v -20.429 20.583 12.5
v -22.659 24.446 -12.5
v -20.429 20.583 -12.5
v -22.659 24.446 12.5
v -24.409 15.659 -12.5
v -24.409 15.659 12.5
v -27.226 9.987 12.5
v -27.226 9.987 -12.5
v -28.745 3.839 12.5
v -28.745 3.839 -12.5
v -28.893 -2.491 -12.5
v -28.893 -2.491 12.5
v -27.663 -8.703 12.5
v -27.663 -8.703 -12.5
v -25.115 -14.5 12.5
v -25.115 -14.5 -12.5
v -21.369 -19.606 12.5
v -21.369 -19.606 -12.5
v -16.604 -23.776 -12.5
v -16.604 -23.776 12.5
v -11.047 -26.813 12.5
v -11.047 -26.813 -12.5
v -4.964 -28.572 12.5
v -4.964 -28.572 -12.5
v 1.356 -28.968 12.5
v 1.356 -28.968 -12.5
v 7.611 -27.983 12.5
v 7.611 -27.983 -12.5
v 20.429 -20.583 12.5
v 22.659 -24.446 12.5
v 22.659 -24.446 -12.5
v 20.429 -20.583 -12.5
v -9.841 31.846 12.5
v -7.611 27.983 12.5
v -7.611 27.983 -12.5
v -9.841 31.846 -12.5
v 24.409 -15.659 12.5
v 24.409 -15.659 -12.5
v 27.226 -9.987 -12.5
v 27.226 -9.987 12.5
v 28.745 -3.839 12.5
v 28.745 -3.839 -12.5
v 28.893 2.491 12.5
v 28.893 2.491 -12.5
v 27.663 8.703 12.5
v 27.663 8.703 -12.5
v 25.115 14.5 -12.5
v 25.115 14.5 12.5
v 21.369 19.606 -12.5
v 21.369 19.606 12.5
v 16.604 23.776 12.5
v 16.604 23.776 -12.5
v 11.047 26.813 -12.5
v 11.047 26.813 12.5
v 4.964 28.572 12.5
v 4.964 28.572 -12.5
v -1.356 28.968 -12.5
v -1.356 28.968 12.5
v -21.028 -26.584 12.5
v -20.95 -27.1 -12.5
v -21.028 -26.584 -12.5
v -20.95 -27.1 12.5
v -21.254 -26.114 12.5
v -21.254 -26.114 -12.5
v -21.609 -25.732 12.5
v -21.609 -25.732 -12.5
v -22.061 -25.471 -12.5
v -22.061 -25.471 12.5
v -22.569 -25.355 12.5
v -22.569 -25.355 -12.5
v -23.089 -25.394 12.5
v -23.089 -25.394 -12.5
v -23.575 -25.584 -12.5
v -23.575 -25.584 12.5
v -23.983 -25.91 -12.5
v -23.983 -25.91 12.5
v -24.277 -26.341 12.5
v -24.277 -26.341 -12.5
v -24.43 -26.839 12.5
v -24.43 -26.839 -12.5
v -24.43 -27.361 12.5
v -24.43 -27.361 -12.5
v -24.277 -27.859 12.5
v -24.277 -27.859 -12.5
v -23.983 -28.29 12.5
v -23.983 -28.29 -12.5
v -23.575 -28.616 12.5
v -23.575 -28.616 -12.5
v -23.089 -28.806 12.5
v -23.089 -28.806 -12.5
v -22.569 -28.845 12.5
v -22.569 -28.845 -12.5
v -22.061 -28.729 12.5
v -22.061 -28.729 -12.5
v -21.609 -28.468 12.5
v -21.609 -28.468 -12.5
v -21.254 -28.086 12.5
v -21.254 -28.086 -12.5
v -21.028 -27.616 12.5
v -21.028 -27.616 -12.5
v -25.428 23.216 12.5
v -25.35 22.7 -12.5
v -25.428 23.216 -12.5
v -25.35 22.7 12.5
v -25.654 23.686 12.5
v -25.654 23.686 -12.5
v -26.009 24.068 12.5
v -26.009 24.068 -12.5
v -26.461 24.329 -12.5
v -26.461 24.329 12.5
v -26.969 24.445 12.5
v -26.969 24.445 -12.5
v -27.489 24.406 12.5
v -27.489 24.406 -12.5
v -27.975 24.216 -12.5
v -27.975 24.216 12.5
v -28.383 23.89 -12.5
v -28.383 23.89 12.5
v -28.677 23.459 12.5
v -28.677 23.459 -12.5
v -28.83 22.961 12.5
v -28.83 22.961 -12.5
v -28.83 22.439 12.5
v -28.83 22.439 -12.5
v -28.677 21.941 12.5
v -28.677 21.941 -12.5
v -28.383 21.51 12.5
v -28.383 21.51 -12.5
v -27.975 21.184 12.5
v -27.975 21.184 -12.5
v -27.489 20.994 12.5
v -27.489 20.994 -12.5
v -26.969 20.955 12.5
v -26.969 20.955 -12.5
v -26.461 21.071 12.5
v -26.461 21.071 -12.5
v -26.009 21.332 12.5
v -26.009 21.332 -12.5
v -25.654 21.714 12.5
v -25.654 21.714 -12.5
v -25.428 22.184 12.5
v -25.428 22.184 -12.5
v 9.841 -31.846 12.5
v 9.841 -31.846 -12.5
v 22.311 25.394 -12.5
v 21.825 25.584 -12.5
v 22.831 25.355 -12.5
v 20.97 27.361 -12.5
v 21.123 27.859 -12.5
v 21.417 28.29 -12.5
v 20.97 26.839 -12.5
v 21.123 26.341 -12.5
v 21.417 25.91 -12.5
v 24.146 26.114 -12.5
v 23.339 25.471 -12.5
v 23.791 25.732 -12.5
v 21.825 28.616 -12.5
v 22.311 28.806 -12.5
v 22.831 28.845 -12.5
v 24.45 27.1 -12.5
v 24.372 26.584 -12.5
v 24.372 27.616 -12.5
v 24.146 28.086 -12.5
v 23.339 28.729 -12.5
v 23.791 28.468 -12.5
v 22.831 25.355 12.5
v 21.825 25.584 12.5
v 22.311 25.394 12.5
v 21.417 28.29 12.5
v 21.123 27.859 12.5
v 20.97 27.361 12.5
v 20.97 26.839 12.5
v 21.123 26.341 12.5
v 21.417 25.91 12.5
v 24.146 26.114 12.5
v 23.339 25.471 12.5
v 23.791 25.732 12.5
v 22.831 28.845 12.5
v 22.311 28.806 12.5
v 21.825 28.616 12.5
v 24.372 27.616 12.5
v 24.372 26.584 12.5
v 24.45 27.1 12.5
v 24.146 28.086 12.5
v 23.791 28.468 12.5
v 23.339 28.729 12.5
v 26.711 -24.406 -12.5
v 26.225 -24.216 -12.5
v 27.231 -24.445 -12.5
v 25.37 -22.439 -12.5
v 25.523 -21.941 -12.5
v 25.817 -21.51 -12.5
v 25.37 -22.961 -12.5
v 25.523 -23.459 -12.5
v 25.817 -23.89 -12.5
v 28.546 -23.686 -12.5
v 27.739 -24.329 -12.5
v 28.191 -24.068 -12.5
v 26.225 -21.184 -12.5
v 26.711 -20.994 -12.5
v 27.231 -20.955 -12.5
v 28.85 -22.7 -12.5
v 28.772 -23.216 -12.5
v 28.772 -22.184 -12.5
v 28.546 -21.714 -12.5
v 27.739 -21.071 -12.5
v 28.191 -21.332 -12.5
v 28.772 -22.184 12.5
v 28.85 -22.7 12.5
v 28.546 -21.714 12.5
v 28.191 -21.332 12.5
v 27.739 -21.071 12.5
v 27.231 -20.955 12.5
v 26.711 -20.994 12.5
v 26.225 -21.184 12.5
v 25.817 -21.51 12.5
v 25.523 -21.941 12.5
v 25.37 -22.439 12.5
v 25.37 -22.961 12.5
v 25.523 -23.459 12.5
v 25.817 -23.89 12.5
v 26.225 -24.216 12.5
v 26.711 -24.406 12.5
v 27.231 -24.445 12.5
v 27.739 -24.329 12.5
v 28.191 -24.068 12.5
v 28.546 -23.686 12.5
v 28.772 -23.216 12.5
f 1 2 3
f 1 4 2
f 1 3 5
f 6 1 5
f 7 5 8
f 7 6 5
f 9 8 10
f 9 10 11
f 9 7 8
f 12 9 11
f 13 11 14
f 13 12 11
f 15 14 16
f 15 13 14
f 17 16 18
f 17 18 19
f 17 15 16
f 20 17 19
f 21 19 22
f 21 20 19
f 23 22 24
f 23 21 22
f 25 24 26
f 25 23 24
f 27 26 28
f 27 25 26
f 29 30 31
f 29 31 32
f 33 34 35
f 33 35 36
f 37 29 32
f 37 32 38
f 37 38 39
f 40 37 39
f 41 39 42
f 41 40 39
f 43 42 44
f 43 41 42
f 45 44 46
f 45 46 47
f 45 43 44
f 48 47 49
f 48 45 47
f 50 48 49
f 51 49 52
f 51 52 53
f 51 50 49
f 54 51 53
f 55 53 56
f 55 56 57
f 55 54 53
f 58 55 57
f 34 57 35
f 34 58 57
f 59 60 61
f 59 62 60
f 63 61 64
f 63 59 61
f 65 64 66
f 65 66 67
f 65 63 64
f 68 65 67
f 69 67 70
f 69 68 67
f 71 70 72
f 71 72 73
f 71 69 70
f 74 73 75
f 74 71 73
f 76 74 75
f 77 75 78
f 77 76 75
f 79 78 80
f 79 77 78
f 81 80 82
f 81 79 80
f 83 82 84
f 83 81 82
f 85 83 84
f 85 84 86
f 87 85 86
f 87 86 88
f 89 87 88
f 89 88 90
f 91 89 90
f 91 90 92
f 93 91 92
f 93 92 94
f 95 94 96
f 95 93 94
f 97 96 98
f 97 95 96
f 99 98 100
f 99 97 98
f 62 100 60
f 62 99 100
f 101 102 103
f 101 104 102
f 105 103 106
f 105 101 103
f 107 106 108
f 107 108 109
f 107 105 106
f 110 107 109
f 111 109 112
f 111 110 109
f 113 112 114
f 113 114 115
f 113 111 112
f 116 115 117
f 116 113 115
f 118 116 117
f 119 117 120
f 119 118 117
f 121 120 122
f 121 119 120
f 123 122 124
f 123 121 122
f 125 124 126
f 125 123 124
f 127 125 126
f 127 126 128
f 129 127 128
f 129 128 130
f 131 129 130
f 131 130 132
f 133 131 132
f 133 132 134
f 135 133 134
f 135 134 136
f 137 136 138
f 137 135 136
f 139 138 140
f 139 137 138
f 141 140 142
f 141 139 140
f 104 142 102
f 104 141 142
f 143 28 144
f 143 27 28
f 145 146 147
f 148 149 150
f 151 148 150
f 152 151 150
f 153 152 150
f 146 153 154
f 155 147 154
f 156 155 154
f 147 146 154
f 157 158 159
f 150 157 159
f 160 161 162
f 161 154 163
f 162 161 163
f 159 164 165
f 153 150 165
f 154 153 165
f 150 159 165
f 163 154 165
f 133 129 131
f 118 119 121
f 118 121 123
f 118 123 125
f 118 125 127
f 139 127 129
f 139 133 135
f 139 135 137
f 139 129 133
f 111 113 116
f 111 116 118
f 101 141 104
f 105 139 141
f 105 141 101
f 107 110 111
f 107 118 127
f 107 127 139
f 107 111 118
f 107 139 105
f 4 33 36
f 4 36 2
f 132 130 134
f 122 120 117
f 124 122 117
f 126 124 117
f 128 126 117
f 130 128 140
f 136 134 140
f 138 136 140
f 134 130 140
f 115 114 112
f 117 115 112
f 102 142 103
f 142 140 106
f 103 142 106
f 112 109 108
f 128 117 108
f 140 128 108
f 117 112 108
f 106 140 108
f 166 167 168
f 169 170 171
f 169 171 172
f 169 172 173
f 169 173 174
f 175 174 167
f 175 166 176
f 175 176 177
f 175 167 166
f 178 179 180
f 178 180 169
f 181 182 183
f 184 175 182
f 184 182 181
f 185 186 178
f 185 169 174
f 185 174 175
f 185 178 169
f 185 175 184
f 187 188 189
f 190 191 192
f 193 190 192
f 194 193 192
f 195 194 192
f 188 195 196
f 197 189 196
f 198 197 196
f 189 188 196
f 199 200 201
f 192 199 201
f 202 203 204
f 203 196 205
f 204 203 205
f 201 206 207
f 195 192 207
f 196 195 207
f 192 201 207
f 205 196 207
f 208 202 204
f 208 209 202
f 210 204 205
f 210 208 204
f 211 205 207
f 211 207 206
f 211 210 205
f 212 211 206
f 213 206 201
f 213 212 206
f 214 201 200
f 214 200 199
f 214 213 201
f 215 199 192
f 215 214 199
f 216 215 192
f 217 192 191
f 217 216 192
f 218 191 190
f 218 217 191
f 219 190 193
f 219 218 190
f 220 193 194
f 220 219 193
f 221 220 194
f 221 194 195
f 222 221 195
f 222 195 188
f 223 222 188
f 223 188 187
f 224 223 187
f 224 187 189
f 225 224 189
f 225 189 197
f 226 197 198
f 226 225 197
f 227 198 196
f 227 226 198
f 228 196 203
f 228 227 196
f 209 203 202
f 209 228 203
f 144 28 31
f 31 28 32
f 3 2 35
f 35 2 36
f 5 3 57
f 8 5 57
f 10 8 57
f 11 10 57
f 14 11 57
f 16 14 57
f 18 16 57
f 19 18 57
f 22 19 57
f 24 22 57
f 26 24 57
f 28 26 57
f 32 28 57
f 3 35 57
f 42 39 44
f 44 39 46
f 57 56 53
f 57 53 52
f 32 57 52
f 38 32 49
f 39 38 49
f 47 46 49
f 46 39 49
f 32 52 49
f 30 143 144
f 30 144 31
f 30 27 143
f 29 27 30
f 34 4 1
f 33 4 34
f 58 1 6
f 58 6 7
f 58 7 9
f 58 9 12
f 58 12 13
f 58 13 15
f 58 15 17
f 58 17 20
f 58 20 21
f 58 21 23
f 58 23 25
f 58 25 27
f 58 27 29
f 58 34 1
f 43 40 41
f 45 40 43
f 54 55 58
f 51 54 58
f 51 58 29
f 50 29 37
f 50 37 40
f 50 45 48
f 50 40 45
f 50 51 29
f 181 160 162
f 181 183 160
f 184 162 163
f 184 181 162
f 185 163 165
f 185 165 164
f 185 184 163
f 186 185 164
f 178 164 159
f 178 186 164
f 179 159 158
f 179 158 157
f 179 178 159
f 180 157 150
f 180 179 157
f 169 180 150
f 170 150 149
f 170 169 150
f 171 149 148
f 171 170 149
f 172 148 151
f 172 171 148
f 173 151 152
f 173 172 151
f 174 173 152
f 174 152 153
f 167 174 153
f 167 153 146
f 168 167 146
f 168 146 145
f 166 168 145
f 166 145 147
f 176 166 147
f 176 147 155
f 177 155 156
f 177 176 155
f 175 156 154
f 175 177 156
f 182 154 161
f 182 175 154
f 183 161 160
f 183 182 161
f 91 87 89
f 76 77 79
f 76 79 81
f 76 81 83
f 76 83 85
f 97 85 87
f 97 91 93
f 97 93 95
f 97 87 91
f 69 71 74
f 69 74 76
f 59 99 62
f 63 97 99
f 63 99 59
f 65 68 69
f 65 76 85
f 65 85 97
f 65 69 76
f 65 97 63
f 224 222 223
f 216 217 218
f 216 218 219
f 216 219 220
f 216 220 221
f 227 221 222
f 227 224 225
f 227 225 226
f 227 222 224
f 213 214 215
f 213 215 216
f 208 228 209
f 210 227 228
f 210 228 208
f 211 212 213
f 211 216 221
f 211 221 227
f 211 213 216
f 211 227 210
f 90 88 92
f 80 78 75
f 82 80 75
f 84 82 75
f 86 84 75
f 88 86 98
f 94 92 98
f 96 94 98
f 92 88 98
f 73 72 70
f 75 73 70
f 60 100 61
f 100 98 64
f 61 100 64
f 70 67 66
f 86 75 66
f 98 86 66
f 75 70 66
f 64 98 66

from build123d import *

# Parameters (mm, degrees)
F1_DEPTH = 12.5
F0_R     = 1.75


with BuildPart() as f1:
    # F0 (on Top) → F1 (new body, symmetric)
    with BuildSketch(Plane.XY):
        with BuildLine():
            Line((20.4285737227, -20.5833276138), (-7.6113977467, 27.9833276138))
            ThreePointArc((-7.6113977467, 27.9833276138), (-14.5, 25.1147367097), (-20.4285737227, 20.5833276138))
            Line((-20.4285737227, 20.5833276138), (7.6113977467, -27.9833276138))
            ThreePointArc((7.6113977467, -27.9833276138), (14.5, -25.1147367097), (20.4285737227, -20.5833276138))
        make_face()
        with BuildLine():
            ThreePointArc((20.4285737227, -20.5833276138), (26.7715206699, -11.1483488025), (29, 0))
            ThreePointArc((29, 0), (17.6106425968, 23.0405136081), (-7.6113977467, 27.9833276138))
            Line((-7.6113977467, 27.9833276138), (20.4285737227, -20.5833276138))
        make_face()
        with BuildLine():
            Line((22.658587988, -24.445825623), (20.4285737227, -20.5833276138))
            ThreePointArc((20.4285737227, -20.5833276138), (14.5, -25.1147367097), (7.6113977467, -27.9833276138))
            Line((7.6113977467, -27.9833276138), (9.841412012, -31.845825623))
            Line((9.841412012, -31.845825623), (22.658587988, -24.445825623))
        make_face()
        with BuildLine():
            ThreePointArc((-20.4285737227, 20.5833276138), (-14.5, 25.1147367097), (-7.6113977467, 27.9833276138))
            Line((-7.6113977467, 27.9833276138), (-9.841412012, 31.845825623))
            Line((-9.841412012, 31.845825623), (-22.658587988, 24.445825623))
            Line((-22.658587988, 24.445825623), (-20.4285737227, 20.5833276138))
        make_face()
        with BuildLine():
            Line((7.6113977467, -27.9833276138), (-20.4285737227, 20.5833276138))
            ThreePointArc((-20.4285737227, 20.5833276138), (-25.1147367097, -14.5), (7.6113977467, -27.9833276138))
        make_face()
    extrude(amount=F1_DEPTH, both=True)


with BuildPart() as f1b:
    # F0 (on Top) → F1, piece 2 (new body, symmetric)
    with BuildSketch(Plane.XY):
        with Locations((27.1, -22.7)):
            Circle(F0_R)
    extrude(amount=F1_DEPTH, both=True)


with BuildPart() as f1c:
    # F0 (on Top) → F1, piece 3 (new body, symmetric)
    with BuildSketch(Plane.XY):
        with Locations((22.7, 27.1)):
            Circle(F0_R)
    extrude(amount=F1_DEPTH, both=True)


with BuildPart() as f1d:
    # F0 (on Top) → F1, piece 4 (new body, symmetric)
    with BuildSketch(Plane.XY):
        with Locations((-27.1, 22.7)):
            Circle(F0_R)
    extrude(amount=F1_DEPTH, both=True)


with BuildPart() as f1e:
    # F0 (on Top) → F1, piece 5 (new body, symmetric)
    with BuildSketch(Plane.XY):
        with Locations((-22.7, -27.1)):
            Circle(F0_R)
    extrude(amount=F1_DEPTH, both=True)


solid = Compound([f1.part, f1b.part, f1c.part, f1d.part, f1e.part])
